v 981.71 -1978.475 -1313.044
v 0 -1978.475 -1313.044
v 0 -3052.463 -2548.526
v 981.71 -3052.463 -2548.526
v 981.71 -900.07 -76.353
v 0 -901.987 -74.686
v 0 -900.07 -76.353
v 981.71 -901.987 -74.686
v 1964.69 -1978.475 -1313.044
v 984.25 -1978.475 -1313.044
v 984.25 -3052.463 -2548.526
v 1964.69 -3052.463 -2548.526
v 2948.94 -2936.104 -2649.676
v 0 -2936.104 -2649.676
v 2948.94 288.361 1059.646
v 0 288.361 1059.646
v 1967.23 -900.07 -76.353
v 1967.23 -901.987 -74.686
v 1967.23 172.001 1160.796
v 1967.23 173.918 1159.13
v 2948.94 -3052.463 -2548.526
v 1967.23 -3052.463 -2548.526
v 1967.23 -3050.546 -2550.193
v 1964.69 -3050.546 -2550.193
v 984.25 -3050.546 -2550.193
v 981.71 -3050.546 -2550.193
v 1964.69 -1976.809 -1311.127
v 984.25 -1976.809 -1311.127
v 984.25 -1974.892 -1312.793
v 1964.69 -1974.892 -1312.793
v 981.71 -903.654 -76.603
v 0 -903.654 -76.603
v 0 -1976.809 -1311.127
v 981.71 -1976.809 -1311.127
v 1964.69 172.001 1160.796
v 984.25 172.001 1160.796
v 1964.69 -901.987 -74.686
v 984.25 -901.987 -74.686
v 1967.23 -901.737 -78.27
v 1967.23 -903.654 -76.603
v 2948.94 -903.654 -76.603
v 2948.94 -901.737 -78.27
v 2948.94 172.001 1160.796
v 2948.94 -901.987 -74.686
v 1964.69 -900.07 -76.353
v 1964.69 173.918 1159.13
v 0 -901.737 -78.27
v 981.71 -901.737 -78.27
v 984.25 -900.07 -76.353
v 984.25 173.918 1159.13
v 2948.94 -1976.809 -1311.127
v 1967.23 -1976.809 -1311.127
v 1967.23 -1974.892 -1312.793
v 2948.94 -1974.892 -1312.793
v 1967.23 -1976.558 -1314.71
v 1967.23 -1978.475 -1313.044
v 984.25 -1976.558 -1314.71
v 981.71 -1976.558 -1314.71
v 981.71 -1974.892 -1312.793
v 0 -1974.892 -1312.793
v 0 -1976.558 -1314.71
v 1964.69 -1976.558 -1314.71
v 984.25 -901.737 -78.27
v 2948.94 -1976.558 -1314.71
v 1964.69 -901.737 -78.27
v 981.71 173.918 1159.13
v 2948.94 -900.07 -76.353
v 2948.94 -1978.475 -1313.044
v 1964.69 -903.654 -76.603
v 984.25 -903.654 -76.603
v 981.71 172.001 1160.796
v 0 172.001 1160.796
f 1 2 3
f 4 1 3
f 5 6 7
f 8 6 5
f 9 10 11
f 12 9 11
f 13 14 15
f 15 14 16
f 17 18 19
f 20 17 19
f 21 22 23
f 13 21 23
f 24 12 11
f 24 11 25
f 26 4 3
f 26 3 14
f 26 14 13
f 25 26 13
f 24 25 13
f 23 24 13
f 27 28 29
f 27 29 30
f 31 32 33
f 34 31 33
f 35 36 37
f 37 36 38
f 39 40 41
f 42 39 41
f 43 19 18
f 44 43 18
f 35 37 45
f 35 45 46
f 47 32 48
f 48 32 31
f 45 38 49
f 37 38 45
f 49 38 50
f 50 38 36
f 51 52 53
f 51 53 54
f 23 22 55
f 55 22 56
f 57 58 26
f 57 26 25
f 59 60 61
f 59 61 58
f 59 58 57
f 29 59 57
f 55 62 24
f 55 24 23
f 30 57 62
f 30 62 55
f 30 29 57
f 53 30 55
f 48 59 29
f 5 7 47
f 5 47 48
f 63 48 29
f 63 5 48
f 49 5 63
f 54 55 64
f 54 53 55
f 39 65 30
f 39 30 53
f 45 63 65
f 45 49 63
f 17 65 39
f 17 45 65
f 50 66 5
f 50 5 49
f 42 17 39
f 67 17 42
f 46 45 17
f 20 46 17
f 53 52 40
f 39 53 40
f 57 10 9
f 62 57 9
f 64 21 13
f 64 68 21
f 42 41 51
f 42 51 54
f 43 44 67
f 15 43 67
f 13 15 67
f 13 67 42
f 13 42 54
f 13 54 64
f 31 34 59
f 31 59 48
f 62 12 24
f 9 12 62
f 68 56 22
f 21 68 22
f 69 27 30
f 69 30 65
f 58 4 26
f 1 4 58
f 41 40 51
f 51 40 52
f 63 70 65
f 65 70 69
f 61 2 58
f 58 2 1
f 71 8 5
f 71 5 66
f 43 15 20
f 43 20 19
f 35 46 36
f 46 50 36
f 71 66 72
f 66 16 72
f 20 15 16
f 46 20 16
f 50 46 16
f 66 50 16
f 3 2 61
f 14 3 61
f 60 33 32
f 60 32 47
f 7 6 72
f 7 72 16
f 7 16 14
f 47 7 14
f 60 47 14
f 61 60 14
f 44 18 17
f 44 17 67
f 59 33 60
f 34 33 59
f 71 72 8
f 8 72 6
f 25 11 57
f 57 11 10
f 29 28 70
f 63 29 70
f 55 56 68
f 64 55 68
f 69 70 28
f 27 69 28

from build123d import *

# Parameters (mm, degrees)
F1_DEPTH = 2948.94
F2_W     = 981.71
F2_H     = 1.27
F2_W_2   = 1.27
F2_H_2   = 1637.03
F2_H_3   = 1635.76
F2_W_3   = 980.44
F3_DEPTH = 2.54
F4_DEPTH = 2.54


with BuildPart() as f1:
    # F0 (on Right) → F1 (new body)
    with BuildSketch(Plane.YZ):
        Polygon((-2936.1038094659, -2649.6760176359), (0, 727.9250450949), (288.3607121196, 1059.646098201), (172.00109846, 1160.7959671727), (-3052.4634231254, -2548.5261486642), align=None)
    extrude(amount=F1_DEPTH)

    # F2 (on face) → F3 (cut)
    with BuildSketch(Plane(origin=(0, -476.780077957, 414.458598623), x_dir=(1, 0, 0), z_dir=(0, -0.7547095802, 0.656059029))):
        with Locations((490.855, -648.7582892498)):
            Rectangle(F2_W, F2_H)
        with Locations((982.345, 170.3917107502)):
            Rectangle(F2_W_2, F2_H_2)
        with Locations((490.855, -650.0282892498)):
            Rectangle(F2_W, F2_H)
        with Locations((982.345, -648.7582892498)):
            Rectangle(F2_W_2, F2_H)
        with Locations((983.615, 170.3917107502)):
            Rectangle(F2_W_2, F2_H_2)
        with Locations((982.345, -650.0282892498)):
            Rectangle(F2_W_2, F2_H)
        with Locations((983.615, -648.7582892498)):
            Rectangle(F2_W_2, F2_H)
        with Locations((490.855, -2287.0582892498)):
            Rectangle(F2_W, F2_H)
        with Locations((982.345, -1468.5432892498)):
            Rectangle(F2_W_2, F2_H_3)
        with Locations((983.615, -650.0282892498)):
            Rectangle(F2_W_2, F2_H)
        with Locations((1474.47, -648.7582892498)):
            Rectangle(F2_W_3, F2_H)
        with Locations((1965.325, 170.3917107502)):
            Rectangle(F2_W_2, F2_H_2)
        with Locations((982.345, -2287.0582892498)):
            Rectangle(F2_W_2, F2_H)
        with Locations((983.615, -1468.5432892498)):
            Rectangle(F2_W_2, F2_H_3)
        with Locations((1474.47, -650.0282892498)):
            Rectangle(F2_W_3, F2_H)
        with Locations((1965.325, -648.7582892498)):
            Rectangle(F2_W_2, F2_H)
        with Locations((1966.595, 170.3917107502)):
            Rectangle(F2_W_2, F2_H_2)
        with Locations((982.345, -2288.3282892498)):
            Rectangle(F2_W_2, F2_H)
        with Locations((983.615, -2287.0582892498)):
            Rectangle(F2_W_2, F2_H)
        with Locations((1965.325, -650.0282892498)):
            Rectangle(F2_W_2, F2_H)
        with Locations((1966.595, -648.7582892498)):
            Rectangle(F2_W_2, F2_H)
        with Locations((983.615, -2288.3282892498)):
            Rectangle(F2_W_2, F2_H)
        with Locations((1966.595, -650.0282892498)):
            Rectangle(F2_W_2, F2_H)
    extrude(amount=-F3_DEPTH, mode=Mode.SUBTRACT)

    # F2 (on face) → F4 (cut)
    with BuildSketch(Plane(origin=(0, -476.780077957, 414.458598623), x_dir=(1, 0, 0), z_dir=(0, -0.7547095802, 0.656059029))):
        with Locations((490.855, -2288.3282892498)):
            Rectangle(F2_W, F2_H)
        with Locations((983.615, -3107.4782892498)):
            Rectangle(F2_W_2, F2_H_2)
        with Locations((982.345, -3107.4782892498)):
            Rectangle(F2_W_2, F2_H_2)
        with Locations((982.345, -2288.3282892498)):
            Rectangle(F2_W_2, F2_H)
        with Locations((1474.47, -2288.3282892498)):
            Rectangle(F2_W_3, F2_H)
        with Locations((1474.47, -2287.0582892498)):
            Rectangle(F2_W_3, F2_H)
        with Locations((2458.085, -648.7582892498)):
            Rectangle(F2_W, F2_H)
        with Locations((2458.085, -650.0282892498)):
            Rectangle(F2_W, F2_H)
        with Locations((1966.595, -1468.5432892498)):
            Rectangle(F2_W_2, F2_H_3)
        with Locations((1965.325, -1468.5432892498)):
            Rectangle(F2_W_2, F2_H_3)
        with Locations((1965.325, -2287.0582892498)):
            Rectangle(F2_W_2, F2_H)
        with Locations((1965.325, -2288.3282892498)):
            Rectangle(F2_W_2, F2_H)
        with Locations((1966.595, -2287.0582892498)):
            Rectangle(F2_W_2, F2_H)
        with Locations((1966.595, -2288.3282892498)):
            Rectangle(F2_W_2, F2_H)
        with Locations((2458.085, -2287.0582892498)):
            Rectangle(F2_W, F2_H)
        with Locations((1965.325, -3107.4782892498)):
            Rectangle(F2_W_2, F2_H_2)
        with Locations((1966.595, -3107.4782892498)):
            Rectangle(F2_W_2, F2_H_2)
        with Locations((2458.085, -2288.3282892498)):
            Rectangle(F2_W, F2_H)
    extrude(amount=-F4_DEPTH, mode=Mode.SUBTRACT)


solid = f1.part
